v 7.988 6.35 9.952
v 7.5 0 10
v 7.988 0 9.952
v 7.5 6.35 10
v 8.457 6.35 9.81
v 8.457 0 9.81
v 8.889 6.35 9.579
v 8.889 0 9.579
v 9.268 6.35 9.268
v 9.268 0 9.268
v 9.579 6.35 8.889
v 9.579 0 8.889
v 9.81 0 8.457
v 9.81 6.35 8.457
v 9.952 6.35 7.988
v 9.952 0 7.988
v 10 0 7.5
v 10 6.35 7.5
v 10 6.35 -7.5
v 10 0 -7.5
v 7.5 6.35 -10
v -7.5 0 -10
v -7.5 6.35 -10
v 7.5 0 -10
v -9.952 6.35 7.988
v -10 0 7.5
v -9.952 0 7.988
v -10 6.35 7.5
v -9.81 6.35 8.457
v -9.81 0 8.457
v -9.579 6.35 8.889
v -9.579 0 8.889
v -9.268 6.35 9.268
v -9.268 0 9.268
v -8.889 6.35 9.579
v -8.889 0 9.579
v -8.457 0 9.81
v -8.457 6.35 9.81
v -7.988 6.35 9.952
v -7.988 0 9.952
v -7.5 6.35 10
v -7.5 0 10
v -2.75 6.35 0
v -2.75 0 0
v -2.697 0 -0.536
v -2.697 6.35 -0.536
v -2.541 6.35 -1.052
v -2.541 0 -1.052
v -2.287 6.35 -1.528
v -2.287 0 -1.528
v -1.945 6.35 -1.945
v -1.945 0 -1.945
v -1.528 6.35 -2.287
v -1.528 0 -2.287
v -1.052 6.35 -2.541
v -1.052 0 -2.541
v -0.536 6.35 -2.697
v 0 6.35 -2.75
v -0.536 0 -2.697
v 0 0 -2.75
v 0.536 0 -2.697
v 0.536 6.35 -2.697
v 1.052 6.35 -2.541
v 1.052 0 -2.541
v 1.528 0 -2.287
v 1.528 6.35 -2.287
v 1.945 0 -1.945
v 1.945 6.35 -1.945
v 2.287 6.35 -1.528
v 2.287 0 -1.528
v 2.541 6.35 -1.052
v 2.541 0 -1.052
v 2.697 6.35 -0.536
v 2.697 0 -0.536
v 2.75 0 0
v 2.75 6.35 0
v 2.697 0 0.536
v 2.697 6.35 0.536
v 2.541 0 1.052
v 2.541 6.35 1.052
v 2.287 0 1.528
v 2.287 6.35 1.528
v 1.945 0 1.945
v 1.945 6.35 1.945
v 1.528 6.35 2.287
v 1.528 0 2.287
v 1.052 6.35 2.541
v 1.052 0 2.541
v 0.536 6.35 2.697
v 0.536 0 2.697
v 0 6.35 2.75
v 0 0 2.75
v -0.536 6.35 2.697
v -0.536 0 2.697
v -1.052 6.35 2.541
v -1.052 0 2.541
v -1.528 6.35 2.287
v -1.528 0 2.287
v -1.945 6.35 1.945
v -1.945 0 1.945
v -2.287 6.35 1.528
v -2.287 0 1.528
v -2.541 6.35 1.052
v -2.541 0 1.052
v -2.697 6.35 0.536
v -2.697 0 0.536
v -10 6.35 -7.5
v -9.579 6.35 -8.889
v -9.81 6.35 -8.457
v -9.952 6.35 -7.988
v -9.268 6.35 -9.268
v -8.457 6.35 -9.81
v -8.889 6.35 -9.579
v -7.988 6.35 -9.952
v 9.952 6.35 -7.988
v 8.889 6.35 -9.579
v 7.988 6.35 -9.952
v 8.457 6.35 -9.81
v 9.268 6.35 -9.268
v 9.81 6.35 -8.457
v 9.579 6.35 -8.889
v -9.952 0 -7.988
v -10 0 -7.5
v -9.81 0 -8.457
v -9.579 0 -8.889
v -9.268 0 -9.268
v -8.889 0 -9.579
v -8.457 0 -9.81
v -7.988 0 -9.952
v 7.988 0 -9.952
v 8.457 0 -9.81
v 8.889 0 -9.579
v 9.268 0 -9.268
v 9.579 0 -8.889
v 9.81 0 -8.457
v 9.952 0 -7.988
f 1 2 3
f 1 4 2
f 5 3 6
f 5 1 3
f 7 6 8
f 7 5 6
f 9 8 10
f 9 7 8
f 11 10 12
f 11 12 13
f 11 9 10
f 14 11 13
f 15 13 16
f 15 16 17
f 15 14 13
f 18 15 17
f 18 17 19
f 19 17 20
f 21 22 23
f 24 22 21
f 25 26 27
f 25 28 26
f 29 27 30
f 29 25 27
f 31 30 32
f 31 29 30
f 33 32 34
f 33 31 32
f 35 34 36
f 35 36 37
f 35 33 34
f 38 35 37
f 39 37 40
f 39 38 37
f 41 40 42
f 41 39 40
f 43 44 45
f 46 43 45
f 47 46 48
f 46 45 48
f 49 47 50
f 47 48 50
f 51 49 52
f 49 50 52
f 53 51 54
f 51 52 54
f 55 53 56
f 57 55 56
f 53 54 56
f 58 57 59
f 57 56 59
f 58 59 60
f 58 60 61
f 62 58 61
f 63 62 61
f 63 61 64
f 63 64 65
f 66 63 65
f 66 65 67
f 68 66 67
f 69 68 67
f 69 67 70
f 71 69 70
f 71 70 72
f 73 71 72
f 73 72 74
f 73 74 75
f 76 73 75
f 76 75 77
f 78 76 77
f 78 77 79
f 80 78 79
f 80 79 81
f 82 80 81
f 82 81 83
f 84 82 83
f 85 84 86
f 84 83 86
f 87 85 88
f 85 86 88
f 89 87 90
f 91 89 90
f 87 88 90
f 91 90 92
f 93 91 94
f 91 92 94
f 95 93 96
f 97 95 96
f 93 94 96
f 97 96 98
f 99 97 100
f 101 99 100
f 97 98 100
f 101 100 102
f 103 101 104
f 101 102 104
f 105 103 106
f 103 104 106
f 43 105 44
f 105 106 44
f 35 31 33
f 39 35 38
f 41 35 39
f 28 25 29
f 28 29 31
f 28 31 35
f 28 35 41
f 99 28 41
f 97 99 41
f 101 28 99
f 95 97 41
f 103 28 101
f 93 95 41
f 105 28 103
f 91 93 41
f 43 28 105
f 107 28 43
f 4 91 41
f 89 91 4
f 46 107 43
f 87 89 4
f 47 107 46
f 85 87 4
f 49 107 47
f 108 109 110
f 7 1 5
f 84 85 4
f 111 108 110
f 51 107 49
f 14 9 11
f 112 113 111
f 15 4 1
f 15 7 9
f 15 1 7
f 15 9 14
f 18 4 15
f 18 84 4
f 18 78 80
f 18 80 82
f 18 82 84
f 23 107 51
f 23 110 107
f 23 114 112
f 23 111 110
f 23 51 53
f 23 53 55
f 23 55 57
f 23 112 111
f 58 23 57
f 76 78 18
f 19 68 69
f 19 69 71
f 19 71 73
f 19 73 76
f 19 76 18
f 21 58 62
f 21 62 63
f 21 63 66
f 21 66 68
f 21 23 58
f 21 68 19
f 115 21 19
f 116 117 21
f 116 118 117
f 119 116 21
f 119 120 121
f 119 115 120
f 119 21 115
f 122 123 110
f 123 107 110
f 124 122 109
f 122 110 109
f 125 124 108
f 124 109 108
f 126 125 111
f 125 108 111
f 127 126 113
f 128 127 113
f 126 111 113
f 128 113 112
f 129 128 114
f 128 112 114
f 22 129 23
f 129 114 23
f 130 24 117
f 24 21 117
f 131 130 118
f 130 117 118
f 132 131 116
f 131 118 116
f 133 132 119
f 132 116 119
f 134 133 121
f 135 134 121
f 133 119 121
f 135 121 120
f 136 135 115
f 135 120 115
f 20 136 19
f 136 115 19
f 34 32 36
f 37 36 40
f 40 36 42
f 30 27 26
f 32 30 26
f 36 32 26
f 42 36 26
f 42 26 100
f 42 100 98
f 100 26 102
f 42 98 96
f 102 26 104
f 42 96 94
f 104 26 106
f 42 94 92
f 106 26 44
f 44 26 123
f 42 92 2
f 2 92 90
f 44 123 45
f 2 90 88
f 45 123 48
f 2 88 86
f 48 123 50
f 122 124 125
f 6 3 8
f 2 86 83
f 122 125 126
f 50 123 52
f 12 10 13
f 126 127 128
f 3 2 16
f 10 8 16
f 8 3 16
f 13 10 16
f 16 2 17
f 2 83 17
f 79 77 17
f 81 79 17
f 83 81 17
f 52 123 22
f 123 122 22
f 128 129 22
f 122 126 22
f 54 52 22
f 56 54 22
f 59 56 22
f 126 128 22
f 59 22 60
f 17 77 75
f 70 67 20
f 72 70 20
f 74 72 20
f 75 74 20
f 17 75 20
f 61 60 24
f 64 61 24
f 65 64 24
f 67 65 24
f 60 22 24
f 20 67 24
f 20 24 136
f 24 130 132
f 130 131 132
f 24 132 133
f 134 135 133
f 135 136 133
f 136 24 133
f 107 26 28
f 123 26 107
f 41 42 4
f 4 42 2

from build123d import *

# Parameters (mm, degrees)
SKETCH1_W            = 20
SKETCH1_H            = 20
BOSS_EXTRUDE1_DEPTH  = 6.35
M5_CLEARANCE_HOLE1_D = 5.5
FILLET1_R            = 2.5


with BuildPart() as part:
    # Sketch1 → Boss-Extrude1 (new body)
    with BuildSketch(Plane(origin=(0, 0, 0), x_dir=(1, 0, 0), z_dir=(0, 1, 0))):
        Rectangle(SKETCH1_W, SKETCH1_H)
    extrude(amount=BOSS_EXTRUDE1_DEPTH)

    # M5 Clearance Hole1 (through all)
    with Locations(Plane(origin=(0, 6.35, 0), x_dir=(1, 0, 0), z_dir=(0, 1, 0))):
        with Locations((0, 0)):
            Hole(M5_CLEARANCE_HOLE1_D / 2)

    # Fillet1
    fillet1_edges = [part.edges().sort_by_distance(p)[0] for p in [
        (10, 3.175, 10),
        (-10, 3.175, 10),
        (-10, 3.175, -10),
        (10, 3.175, -10),
    ]]
    fillet(fillet1_edges, radius=FILLET1_R)


solid = part.part
